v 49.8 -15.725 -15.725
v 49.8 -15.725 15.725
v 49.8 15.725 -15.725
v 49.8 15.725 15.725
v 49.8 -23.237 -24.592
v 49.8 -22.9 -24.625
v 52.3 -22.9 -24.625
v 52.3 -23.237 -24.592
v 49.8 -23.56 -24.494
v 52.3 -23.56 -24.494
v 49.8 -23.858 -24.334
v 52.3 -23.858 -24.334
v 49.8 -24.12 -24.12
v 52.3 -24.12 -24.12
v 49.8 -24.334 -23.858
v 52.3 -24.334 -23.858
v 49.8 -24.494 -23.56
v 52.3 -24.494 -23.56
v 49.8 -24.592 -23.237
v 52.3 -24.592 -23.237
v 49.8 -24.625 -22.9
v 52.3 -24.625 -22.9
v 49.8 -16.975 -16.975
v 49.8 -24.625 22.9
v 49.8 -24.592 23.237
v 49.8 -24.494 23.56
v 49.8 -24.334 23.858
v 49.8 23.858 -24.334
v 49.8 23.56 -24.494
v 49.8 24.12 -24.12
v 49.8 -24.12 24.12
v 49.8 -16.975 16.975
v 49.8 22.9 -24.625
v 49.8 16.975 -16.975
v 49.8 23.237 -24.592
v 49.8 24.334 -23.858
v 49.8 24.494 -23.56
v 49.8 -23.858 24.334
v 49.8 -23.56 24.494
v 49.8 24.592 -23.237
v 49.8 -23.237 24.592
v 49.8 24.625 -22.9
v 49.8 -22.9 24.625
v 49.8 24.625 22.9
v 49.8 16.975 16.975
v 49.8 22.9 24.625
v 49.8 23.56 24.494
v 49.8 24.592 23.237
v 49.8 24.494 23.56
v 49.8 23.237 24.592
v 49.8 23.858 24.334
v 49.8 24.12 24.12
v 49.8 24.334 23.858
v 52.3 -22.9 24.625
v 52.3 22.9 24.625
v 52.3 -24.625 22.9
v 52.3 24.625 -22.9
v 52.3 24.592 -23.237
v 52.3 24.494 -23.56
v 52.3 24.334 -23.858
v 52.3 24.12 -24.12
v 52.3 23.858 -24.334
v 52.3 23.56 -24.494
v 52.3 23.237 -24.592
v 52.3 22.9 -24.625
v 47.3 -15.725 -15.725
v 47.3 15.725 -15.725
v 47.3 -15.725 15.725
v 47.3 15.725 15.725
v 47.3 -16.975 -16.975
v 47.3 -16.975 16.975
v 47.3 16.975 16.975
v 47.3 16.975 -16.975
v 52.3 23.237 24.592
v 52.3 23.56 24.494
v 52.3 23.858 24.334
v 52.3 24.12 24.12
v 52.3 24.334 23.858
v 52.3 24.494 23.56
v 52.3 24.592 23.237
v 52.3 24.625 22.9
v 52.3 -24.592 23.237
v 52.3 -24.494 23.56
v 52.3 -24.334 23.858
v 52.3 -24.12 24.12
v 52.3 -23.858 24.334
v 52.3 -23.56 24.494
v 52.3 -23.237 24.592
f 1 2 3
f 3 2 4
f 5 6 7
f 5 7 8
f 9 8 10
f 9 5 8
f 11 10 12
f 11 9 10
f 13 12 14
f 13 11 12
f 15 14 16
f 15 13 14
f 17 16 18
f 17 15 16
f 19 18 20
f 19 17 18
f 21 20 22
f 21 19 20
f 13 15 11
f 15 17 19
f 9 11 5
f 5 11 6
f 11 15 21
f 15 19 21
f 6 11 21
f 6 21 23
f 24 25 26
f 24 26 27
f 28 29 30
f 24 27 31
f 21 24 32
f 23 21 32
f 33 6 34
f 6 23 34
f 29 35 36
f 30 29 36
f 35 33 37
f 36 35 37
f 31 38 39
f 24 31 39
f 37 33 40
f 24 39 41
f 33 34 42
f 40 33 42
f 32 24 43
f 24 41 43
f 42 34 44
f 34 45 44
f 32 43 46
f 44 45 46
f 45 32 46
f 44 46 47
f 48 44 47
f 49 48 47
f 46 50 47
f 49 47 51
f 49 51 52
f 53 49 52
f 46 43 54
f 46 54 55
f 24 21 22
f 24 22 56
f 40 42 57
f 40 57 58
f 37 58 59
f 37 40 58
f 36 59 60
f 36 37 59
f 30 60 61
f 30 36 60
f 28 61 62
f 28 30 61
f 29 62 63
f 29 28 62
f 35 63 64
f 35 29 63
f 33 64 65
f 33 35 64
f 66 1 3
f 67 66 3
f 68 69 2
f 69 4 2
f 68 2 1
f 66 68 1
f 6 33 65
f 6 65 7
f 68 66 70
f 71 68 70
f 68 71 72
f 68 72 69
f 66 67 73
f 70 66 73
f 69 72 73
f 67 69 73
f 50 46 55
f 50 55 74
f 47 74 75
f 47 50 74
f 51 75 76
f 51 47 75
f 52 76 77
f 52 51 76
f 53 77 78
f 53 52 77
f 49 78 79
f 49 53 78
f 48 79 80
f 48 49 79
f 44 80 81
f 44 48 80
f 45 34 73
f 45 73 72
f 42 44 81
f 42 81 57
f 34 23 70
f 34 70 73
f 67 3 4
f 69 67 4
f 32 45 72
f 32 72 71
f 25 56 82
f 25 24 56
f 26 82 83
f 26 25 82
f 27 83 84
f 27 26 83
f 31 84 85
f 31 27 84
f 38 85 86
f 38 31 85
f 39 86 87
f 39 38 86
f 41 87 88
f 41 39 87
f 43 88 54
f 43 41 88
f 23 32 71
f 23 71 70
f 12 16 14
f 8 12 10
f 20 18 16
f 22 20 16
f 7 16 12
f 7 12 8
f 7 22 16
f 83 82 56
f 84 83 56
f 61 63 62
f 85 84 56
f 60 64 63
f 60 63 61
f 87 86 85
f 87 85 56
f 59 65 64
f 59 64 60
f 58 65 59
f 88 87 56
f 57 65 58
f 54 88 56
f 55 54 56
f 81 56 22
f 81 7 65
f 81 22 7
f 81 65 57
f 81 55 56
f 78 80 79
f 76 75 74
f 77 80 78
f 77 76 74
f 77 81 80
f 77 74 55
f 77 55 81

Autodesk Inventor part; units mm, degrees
ref_plane "YZ Plane" through (0, 0, 0) normal (1, 0, 0) x (0, 1, 0)
ref_plane "XZ Plane" through (0, 0, 0) normal (0, 1, 0) x (-1, 0, 0)
sketch "Sketch1" plane through (0, 0, 0) normal (1, 0, 0) x (0, 1, 0)
  circle A0 centre (-21.9, 21.9) radius 1.875 projected
  circle A1 centre (21.9, -21.9) radius 1.875 projected
  circle A2 centre (-21.9, -21.9) radius 1.875 projected
  circle A3 centre (21.9, 21.9) radius 1.875 projected
  circle A4 centre (20.8, -14.4) radius 2.0734 projected
  circle A5 centre (-20.8, 14.4) radius 2.0734 projected
  circle A6 centre (-20.8, -14.4) radius 2.0734 projected
  circle A7 centre (-14.4, -20.8) radius 2.0734 projected
  line L0 (17.05, 17.05) -> (-17.05, 17.05) projected
  line L1 (17.05, -17.05) -> (17.05, 17.05) projected
  line L2 (-17.05, -17.05) -> (17.05, -17.05) projected
  line L3 (-17.05, 17.05) -> (-17.05, -17.05) projected
  circle A8 centre (14.4, -20.8) radius 2.0734 projected
  circle A9 centre (20.8, 14.4) radius 2.0734 projected
  circle A10 centre (-14.4, 20.8) radius 2.0734 projected
  circle A11 centre (14.4, 20.8) radius 2.0734 projected
  line L4 (24.875, 22.9) -> (24.875, -22.9) projected
  arc A12 (24.875, 22.9) -> (22.9, 24.875) centre (22.9, 22.9) ccw projected
  line L5 (-22.9, 24.875) -> (22.9, 24.875) projected
  arc A13 (-22.9, 24.875) -> (-24.875, 22.9) centre (-22.9, 22.9) ccw projected
  line L6 (-24.875, -22.9) -> (-24.875, 22.9) projected
  arc A14 (-24.875, -22.9) -> (-22.9, -24.875) centre (-22.9, -22.9) ccw projected
  line L7 (22.9, -24.875) -> (-22.9, -24.875) projected
  arc A15 (22.9, -24.875) -> (24.875, -22.9) centre (22.9, -22.9) ccw projected
  arc A16 (-24.625, -22.9) -> (-22.9, -24.625) centre (-22.9, -22.9) ccw
  line L8 (-24.625, -22.9) -> (-24.625, 22.9)
  arc A17 (-22.9, 24.625) -> (-24.625, 22.9) centre (-22.9, 22.9) ccw
  line L9 (-22.9, 24.625) -> (22.9, 24.625)
  arc A18 (24.625, 22.9) -> (22.9, 24.625) centre (22.9, 22.9) ccw
  line L10 (24.625, 22.9) -> (24.625, -22.9)
  arc A19 (22.9, -24.625) -> (24.625, -22.9) centre (22.9, -22.9) ccw
  line L11 (22.9, -24.625) -> (-22.9, -24.625)
  point P0 (0, 0)
  dimension "d0" = 0.25
ref_plane "Work Plane1" through (49.8, -24.875, -24.875) normal (1, 0, 0) x (0, 1, 0)
extrude "Extrusion1" add sketch "Sketch1" along normal blind 2.5 from surface at 49.8 contours A0 | A1 | A2 | A3 | A4 | A5 | A6 | A7 | L1 L2 L3 L0 | A8 | A9 | A10 | A11 | L8 A17 L9 A18 L10 A19 L11 A16
sketch "Sketch2" plane through (52.3, -22.9, -24.625) normal (1, 0, 0) x (0, 0, -1)
  circle A0 centre (-46.525, 1) radius 1.875 projected
  circle A1 centre (-2.725, 44.8) radius 1.875 projected
  circle A2 centre (-2.725, 1) radius 1.875 projected
  circle A3 centre (-46.525, 44.8) radius 1.875 projected
  circle A4 centre (-10.225, 43.7) radius 2.0734 projected
  circle A5 centre (-39.025, 2.1) radius 2.0734 projected
  circle A6 centre (-10.225, 2.1) radius 2.0734 projected
  circle A7 centre (-3.825, 8.5) radius 2.0734 projected
  line L0 (-41.675, 39.95) -> (-41.675, 5.85) projected
  line L1 (-7.575, 39.95) -> (-41.675, 39.95) projected
  line L2 (-7.575, 5.85) -> (-7.575, 39.95) projected
  line L3 (-41.675, 5.85) -> (-7.575, 5.85) projected
  circle A8 centre (-3.825, 37.3) radius 2.0734 projected
  circle A9 centre (-39.025, 43.7) radius 2.0734 projected
  circle A10 centre (-45.425, 8.5) radius 2.0734 projected
  circle A11 centre (-45.425, 37.3) radius 2.0734 projected
  line L4 (-47.525, 47.775) -> (-1.725, 47.775) projected
  arc A12 (-47.525, 47.775) -> (-49.5, 45.8) centre (-47.525, 45.8) ccw projected
  line L5 (-49.5, 0) -> (-49.5, 45.8) projected
  arc A13 (-49.5, 0) -> (-47.525, -1.975) centre (-47.525, 0) ccw projected
  line L6 (-1.725, -1.975) -> (-47.525, -1.975) projected
  arc A14 (-1.725, -1.975) -> (0.25, 0) centre (-1.725, 0) ccw projected
  line L7 (0.25, 45.8) -> (0.25, 0) projected
  arc A15 (0.25, 45.8) -> (-1.725, 47.775) centre (-1.725, 45.8) ccw projected
  line L8 (-41.6, 39.875) -> (-41.6, 5.925)
  line L9 (-41.6, 5.925) -> (-7.65, 5.925)
  line L10 (-7.65, 5.925) -> (-7.65, 39.875)
  line L11 (-7.65, 39.875) -> (-41.6, 39.875)
  line L12 (-40.35, 38.625) -> (-40.35, 7.175)
  line L13 (-40.35, 7.175) -> (-8.9, 7.175)
  line L14 (-8.9, 7.175) -> (-8.9, 38.625)
  line L15 (-8.9, 38.625) -> (-40.35, 38.625)
  dimension "d16" = 0.075
  dimension "d17" = 1.25
extrude "Extrusion2" add sketch "Sketch2" against normal blind 2.5 from surface at -2.5 contours L11 L10 L9 L8
properties part number "Cover Top (Normal) Proto"
